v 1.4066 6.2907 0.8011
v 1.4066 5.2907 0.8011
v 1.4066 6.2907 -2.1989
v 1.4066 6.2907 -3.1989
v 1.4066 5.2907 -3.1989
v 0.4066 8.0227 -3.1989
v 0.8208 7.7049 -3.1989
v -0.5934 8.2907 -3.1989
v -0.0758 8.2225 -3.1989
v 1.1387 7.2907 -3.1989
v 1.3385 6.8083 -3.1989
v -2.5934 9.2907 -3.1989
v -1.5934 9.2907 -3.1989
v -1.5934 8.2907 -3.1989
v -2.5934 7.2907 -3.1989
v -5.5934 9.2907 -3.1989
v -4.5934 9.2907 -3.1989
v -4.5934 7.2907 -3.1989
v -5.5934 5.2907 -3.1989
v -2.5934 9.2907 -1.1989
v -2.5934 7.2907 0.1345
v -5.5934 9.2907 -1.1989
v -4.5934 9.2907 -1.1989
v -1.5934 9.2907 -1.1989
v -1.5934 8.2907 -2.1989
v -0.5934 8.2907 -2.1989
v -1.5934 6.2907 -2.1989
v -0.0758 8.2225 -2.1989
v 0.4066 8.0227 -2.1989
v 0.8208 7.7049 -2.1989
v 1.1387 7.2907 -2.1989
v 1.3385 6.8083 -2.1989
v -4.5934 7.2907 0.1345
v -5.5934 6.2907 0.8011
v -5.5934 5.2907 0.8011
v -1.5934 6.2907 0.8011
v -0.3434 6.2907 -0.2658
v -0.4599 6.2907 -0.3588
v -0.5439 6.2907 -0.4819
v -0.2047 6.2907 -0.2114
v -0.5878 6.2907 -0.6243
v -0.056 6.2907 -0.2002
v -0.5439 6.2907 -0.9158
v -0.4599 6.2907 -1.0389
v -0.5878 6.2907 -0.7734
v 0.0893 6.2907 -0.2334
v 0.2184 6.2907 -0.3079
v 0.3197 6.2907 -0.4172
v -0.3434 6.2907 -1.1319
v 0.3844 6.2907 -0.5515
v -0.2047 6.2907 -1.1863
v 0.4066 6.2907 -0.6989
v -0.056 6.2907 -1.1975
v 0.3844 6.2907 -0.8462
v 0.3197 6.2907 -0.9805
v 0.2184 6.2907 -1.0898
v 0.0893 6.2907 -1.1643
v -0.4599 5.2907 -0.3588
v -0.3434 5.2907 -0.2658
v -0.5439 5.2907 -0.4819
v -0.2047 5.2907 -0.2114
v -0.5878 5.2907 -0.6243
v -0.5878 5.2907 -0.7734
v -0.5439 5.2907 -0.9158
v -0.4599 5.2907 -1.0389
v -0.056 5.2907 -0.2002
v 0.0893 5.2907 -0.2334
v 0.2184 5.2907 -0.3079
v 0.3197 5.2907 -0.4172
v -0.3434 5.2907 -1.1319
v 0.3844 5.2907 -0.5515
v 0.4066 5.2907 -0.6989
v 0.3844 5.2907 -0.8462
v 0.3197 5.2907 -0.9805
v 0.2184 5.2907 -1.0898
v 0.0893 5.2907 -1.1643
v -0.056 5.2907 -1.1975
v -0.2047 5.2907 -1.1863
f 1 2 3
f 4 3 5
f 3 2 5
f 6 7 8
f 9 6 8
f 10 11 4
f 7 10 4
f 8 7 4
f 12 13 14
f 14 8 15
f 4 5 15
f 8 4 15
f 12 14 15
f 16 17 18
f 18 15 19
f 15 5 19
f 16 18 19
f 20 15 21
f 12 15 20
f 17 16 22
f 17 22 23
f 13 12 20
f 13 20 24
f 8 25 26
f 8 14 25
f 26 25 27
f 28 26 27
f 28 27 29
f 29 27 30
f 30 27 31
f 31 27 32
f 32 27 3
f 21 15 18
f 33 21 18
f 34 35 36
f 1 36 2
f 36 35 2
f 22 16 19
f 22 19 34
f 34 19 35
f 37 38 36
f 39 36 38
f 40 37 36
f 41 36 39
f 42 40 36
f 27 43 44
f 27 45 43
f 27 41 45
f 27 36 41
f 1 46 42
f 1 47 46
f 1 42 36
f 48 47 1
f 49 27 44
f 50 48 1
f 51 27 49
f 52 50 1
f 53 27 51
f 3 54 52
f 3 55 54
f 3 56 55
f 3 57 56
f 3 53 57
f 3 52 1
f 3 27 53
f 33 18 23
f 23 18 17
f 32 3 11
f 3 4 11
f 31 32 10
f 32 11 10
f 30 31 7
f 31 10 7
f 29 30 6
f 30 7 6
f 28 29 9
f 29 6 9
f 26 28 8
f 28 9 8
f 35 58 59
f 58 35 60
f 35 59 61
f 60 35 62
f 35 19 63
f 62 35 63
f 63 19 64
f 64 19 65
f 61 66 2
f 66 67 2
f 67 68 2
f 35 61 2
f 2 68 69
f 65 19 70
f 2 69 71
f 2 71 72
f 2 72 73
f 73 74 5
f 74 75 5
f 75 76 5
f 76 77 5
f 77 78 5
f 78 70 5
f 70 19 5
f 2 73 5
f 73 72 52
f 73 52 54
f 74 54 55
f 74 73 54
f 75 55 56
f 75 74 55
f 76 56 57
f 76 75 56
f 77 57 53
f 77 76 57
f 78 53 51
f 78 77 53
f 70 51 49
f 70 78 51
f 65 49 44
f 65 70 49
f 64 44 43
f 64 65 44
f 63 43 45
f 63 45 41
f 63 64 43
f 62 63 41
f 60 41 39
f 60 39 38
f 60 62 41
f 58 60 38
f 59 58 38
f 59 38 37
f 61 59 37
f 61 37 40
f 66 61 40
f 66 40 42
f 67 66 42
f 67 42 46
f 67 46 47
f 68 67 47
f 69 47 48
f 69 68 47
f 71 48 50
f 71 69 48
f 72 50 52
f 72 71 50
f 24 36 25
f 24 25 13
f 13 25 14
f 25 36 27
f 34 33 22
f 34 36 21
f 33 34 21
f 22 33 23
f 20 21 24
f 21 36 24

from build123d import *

# Parameters (mm, degrees)
SKETCH_1_W          = 15
SKETCH_1_H          = 15
SKETCH_1_R          = 2.5
EXTRUDE_1_DEPTH     = 5
SKETCH_1_3_W        = 15
SKETCH_1_3_H        = 5
EXTRUDE_2_DEPTH     = 15
EXTRUDE_3_DEPTH     = 20
CUT_EXTRUDE_1_DEPTH = 20
SKETCH_3_W          = 10
SKETCH_3_H          = 10
CUT_EXTRUDE_2_DEPTH = 20
FILLET_1_R          = 10
SCALE_1_SCALE       = 0.2


with BuildPart() as part:
    # 草圖1 → 填料-伸長1 (new body)
    with BuildSketch(Plane(origin=(0, 0, 0), x_dir=(1, 0, 0), z_dir=(0, 1, 0))):
        with Locations((10, -2.5)):
            Rectangle(SKETCH_1_W, SKETCH_1_H)
        with Locations((10, -2.5)):
            Circle(SKETCH_1_R, mode=Mode.SUBTRACT)
    extrude(amount=EXTRUDE_1_DEPTH)

    # 草圖1<3> → 填料-伸長2 (add)
    with BuildSketch(Plane(origin=(0, 0, 0), x_dir=(1, 0, 0), z_dir=(0, 1, 0))):
        with Locations((10, 7.5)):
            Rectangle(SKETCH_1_3_W, SKETCH_1_3_H)
    extrude(amount=EXTRUDE_2_DEPTH)

    # 草圖1<4> → 填料-伸長3 (add)
    with BuildSketch(Plane(origin=(0, 0, 0), x_dir=(1, 0, 0), z_dir=(0, 1, 0))):
        Polygon((-17.5, 10), (-17.5, -10), (2.5, -10), (2.5, 5), (2.5, 10), align=None)
    extrude(amount=EXTRUDE_3_DEPTH)

    # 草圖2 → 除料-伸長1 (cut)
    with BuildSketch(Plane(origin=(2.5, 0, 0), x_dir=(0, 0, -1), z_dir=(1, 0, 0))):
        Polygon((-10, 5), (0, 20), (-10, 20), align=None)
    extrude(amount=-CUT_EXTRUDE_1_DEPTH, mode=Mode.SUBTRACT)

    # 草圖3 → 除料-伸長2 (cut)
    with BuildSketch(Plane(origin=(0, 0, -10), x_dir=(-1, 0, 0), z_dir=(0, 0, -1))):
        with Locations((7.5, 15)):
            Rectangle(SKETCH_3_W, SKETCH_3_H)
    extrude(amount=-CUT_EXTRUDE_2_DEPTH, mode=Mode.SUBTRACT)

    # 圓角1
    fillet_1_edges = [part.edges().sort_by_distance(p)[0] for p in [
        (17.5, 15, -7.5),
    ]]
    fillet(fillet_1_edges, radius=FILLET_1_R)


with BuildPart() as part_1:
    # 縮放比例1: scaled about (-2.616743612, 6.613370919, -1.498562555)
    add(part.part.scale(SCALE_1_SCALE).moved(Location((-2.09339489, 5.290696735, -1.198850044))))


solid = part_1.part
